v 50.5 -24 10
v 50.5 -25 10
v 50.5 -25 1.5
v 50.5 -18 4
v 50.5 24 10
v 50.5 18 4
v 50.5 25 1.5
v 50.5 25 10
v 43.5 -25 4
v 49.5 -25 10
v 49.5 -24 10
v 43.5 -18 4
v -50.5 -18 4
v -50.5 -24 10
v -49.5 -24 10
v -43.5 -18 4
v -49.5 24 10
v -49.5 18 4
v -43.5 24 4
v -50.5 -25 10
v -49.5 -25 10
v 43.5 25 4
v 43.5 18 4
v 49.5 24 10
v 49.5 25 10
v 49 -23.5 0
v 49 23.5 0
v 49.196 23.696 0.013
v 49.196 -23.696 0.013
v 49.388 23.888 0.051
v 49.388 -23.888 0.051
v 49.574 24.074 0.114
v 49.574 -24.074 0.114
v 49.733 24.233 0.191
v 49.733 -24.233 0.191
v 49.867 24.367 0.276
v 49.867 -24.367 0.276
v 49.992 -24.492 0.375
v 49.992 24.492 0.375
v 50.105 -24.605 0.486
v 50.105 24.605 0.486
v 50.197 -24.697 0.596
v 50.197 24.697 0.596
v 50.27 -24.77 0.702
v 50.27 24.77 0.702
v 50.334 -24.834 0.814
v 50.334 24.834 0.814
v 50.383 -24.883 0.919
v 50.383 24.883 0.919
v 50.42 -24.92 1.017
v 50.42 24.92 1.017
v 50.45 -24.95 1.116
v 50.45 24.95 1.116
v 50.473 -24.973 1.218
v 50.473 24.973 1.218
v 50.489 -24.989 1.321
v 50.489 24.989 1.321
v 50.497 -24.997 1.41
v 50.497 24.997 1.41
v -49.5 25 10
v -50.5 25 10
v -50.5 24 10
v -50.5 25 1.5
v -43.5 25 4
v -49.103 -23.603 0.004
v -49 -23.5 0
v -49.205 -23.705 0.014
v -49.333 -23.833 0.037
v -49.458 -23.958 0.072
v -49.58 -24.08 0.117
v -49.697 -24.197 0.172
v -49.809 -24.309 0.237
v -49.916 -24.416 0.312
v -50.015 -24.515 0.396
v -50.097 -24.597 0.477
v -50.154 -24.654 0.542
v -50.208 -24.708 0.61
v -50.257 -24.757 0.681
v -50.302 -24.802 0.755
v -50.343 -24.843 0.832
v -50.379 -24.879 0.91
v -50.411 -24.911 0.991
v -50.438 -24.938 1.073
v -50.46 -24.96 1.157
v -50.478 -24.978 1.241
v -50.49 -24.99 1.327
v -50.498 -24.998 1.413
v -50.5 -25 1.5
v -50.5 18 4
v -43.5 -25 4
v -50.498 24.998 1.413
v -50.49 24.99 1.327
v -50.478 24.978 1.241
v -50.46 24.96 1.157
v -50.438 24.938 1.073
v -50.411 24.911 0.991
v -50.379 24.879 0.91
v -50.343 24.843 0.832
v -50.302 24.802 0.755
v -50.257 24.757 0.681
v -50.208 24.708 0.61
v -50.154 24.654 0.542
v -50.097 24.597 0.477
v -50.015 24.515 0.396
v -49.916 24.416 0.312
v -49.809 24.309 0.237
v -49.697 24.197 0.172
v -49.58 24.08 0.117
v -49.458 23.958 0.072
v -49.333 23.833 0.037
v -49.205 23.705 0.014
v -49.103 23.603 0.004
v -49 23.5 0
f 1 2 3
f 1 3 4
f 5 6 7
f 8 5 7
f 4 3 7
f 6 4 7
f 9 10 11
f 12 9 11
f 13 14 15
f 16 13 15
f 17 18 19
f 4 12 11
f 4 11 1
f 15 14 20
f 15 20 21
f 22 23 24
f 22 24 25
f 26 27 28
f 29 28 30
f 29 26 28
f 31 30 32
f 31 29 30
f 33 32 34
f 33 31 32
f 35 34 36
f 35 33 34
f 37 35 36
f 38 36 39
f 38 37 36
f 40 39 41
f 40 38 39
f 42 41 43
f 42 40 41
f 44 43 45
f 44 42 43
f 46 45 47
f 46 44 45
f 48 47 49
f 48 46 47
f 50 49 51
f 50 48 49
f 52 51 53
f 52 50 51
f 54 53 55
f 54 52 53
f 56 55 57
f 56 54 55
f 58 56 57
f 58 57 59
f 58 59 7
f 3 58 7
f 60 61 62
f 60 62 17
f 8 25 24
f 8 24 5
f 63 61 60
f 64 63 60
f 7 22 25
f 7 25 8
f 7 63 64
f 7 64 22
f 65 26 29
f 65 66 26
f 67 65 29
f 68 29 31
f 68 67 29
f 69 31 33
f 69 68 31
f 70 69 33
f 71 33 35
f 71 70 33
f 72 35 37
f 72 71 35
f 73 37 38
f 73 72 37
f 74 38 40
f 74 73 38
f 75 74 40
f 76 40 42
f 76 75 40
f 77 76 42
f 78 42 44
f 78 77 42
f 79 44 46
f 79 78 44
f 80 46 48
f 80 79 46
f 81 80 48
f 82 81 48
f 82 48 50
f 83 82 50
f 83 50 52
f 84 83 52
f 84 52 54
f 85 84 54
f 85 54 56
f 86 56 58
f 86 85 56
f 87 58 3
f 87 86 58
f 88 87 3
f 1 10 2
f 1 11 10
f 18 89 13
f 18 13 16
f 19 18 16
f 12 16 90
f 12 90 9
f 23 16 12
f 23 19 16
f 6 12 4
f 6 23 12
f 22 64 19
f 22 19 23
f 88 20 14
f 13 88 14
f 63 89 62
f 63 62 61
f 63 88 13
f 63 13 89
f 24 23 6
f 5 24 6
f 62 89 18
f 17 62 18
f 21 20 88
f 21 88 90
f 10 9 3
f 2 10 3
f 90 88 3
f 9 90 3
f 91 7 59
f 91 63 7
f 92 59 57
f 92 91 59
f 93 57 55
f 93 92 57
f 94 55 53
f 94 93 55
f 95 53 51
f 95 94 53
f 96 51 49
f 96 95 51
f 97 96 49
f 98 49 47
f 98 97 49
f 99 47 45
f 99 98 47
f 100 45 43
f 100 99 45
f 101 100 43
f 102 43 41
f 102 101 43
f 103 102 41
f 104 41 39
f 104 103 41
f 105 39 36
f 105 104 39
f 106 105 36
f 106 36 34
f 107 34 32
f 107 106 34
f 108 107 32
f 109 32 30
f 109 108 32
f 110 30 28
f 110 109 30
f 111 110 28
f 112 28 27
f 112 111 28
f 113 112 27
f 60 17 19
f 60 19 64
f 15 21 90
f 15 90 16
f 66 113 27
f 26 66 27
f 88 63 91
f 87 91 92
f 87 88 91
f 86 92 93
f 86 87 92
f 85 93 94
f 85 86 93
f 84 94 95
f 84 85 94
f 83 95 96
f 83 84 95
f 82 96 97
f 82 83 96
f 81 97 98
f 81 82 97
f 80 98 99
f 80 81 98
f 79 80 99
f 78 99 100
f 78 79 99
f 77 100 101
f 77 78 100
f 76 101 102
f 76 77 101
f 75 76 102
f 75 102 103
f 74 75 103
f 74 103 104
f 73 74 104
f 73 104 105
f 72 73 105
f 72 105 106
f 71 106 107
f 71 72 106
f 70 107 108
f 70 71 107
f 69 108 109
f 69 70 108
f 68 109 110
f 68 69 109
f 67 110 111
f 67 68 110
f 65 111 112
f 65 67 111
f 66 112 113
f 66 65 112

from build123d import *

# Parameters (mm, degrees)
F1_DEPTH = 4
F0_W     = 7
F0_H     = 7
F2_DEPTH = 10
F3_SIZE  = 5.99999
F4_R     = 1.5


# Not quite as in the source:
# - a fillet or chamfer is up to 0.001 mm smaller than in the source, because OpenCascade refuses the exact size


with BuildPart() as f1:
    # F0 (on Top) → F1 (new body)
    with BuildSketch(Plane.XY):
        Polygon((43.5, 25), (-43.5, 25), (-43.5, 18), (-50.5, 18), (-50.5, -18), (-43.5, -18), (-43.5, -25), (43.5, -25), (43.5, -18), (50.5, -18), (50.5, 18), (43.5, 18), align=None)
    extrude(amount=F1_DEPTH)

    # F0 (on Top) → F2 (join)
    with BuildSketch(Plane.XY):
        with Locations((-47, 21.5)):
            Rectangle(F0_W, F0_H)
        with Locations((-47, -21.5)):
            Rectangle(F0_W, F0_H)
        with Locations((47, 21.5)):
            Rectangle(F0_W, F0_H)
        with Locations((47, -21.5)):
            Rectangle(F0_W, F0_H)
    extrude(amount=F2_DEPTH)

    # F3 (size 6 in the source; OpenCascade refuses exactly that, so slightly less here)
    f3_edges = [f1.edges().sort_by_distance(p)[0] for p in [
        (-43.5, 18, 7),
        (-47, 18, 10),
        (-43.5, 21.5, 10),
        (43.5, 21.5, 10),
        (47, 18, 10),
        (47, -18, 10),
        (43.5, -21.5, 10),
        (-43.5, -21.5, 10),
        (-47, -18, 10),
    ]]
    chamfer(f3_edges, length=F3_SIZE)

    # F4
    f4_edges = [f1.edges().sort_by_distance(p)[0] for p in [
        (-50.5, 0, 0),
        (0, -25, 0),
        (50.5, 0, 0),
        (0, 25, 0),
    ]]
    fillet(f4_edges, radius=F4_R)


solid = f1.part
